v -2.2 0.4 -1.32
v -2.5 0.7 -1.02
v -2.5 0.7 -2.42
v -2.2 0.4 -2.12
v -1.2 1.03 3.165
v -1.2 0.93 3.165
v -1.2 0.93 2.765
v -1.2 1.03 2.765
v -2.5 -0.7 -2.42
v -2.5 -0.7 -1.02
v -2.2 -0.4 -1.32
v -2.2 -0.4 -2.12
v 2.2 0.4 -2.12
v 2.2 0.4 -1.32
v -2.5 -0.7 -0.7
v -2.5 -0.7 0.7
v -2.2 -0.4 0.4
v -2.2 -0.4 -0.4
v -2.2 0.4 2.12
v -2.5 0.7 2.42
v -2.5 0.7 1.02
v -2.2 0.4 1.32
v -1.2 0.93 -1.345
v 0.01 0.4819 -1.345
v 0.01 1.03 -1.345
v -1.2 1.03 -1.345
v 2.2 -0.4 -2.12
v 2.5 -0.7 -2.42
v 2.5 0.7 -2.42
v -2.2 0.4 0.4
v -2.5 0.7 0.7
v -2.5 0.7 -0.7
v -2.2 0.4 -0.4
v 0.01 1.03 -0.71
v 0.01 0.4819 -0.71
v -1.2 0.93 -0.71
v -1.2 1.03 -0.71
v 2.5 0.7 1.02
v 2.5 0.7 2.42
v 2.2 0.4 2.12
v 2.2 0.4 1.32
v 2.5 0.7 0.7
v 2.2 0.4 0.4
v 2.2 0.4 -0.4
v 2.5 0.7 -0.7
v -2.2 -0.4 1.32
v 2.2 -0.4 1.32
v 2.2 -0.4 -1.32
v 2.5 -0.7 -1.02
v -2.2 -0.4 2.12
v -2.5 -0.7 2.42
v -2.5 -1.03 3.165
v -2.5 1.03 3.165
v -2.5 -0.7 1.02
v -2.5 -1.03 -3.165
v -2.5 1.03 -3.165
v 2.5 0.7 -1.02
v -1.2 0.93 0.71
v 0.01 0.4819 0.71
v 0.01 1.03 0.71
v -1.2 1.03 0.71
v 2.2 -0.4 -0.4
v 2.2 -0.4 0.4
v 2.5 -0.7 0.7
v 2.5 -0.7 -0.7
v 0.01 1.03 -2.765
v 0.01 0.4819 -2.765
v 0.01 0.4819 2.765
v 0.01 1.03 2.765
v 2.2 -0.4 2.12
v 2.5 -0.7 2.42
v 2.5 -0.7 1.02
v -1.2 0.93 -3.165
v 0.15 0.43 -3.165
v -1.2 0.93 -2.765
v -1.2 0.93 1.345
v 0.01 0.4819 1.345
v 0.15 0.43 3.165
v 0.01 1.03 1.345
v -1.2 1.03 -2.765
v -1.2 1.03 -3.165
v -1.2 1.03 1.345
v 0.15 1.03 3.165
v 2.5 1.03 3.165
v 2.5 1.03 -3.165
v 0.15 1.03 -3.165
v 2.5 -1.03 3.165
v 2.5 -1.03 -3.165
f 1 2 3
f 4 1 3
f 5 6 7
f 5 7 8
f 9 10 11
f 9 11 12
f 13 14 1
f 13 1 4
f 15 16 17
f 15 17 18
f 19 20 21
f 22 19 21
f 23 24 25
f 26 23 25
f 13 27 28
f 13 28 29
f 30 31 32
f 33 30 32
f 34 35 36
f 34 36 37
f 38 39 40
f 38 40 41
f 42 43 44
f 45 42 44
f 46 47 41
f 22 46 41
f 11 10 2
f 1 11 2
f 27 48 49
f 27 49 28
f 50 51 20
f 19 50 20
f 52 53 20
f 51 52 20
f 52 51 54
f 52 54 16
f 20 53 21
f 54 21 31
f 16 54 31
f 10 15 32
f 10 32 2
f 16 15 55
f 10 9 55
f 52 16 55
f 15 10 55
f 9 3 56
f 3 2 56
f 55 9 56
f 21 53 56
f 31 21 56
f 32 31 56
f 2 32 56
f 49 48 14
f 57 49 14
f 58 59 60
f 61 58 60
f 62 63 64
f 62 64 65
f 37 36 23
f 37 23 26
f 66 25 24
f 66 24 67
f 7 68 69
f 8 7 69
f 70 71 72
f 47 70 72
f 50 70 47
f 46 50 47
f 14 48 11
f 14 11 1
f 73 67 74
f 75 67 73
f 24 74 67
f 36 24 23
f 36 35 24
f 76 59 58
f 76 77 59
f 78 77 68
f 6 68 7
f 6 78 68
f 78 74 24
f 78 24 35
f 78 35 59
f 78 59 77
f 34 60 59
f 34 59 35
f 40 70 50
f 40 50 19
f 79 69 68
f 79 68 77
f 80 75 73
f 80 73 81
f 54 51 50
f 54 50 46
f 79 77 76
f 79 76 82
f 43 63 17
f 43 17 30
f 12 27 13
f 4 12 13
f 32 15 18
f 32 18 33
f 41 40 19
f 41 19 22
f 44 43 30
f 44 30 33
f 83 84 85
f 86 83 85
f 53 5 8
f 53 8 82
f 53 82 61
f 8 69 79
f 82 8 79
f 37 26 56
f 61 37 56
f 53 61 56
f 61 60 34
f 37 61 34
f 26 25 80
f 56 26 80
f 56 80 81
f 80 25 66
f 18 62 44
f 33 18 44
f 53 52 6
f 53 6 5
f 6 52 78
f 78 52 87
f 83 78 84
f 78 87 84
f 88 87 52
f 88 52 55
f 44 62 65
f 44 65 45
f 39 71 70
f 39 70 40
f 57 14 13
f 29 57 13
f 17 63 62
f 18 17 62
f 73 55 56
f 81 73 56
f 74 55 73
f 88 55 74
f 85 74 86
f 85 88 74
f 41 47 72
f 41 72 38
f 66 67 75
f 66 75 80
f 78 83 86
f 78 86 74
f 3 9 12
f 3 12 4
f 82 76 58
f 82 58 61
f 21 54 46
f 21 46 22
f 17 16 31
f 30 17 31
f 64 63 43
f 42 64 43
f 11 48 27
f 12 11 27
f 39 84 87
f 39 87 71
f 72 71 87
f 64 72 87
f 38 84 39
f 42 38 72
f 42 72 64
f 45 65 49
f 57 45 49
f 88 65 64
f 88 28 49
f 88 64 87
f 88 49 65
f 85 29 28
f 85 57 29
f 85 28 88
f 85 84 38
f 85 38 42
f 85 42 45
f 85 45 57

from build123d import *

# Parameters (mm, degrees)
SKETCH1_W           = 6.33
SKETCH1_H           = 2.06
SKETCH1_W_2         = 0.8
SKETCH1_H_2         = 0.8
BOSS_EXTRUDE1_DEPTH = 2.5
CUT_EXTRUDE1_DEPTH  = 7.25
SKETCH3_W           = 1.42
SKETCH3_H           = 0.63
BOSS_EXTRUDE2_DEPTH = 1.21
CHAMFER1_SIZE       = 0.3


with BuildPart() as part:
    # Sketch1 → Boss-Extrude1 (new, symmetric)
    with BuildSketch(Plane(origin=(0, 0, 0), x_dir=(0, 0, -1), z_dir=(1, 0, 0))):
        Rectangle(SKETCH1_W, SKETCH1_H)
        Rectangle(SKETCH1_W_2, SKETCH1_H_2, mode=Mode.SUBTRACT)
        with Locations((-1.72, 0)):
            Rectangle(SKETCH1_W_2, SKETCH1_H_2, mode=Mode.SUBTRACT)
        with Locations((1.72, 0)):
            Rectangle(SKETCH1_W_2, SKETCH1_H_2, mode=Mode.SUBTRACT)
    extrude(amount=BOSS_EXTRUDE1_DEPTH, both=True)

    # Sketch2 → Cut-Extrude1 (cut)
    with BuildSketch(Plane.XY.offset(3.165)):
        Polygon((-1.2, 2.722191774), (0.15, 2.722191774), (0.15, 0.43), (-1.2, 0.93), align=None)
    extrude(amount=-CUT_EXTRUDE1_DEPTH, mode=Mode.SUBTRACT)

    # Sketch3 → Boss-Extrude2 (add)
    with BuildSketch(Plane(origin=(-1.2, 0, 0), x_dir=(0, 0, -1), z_dir=(1, 0, 0))):
        with Locations((-2.055, 0.715)):
            Rectangle(SKETCH3_W, SKETCH3_H)
        with Locations((0, 0.715)):
            Rectangle(SKETCH3_W, SKETCH3_H)
        with Locations((2.055, 0.715)):
            Rectangle(SKETCH3_W, SKETCH3_H)
    extrude(amount=BOSS_EXTRUDE2_DEPTH)

    # Chamfer1
    chamfer1_edges = [part.edges().sort_by_distance(p)[0] for p in [
        (-2.5, 0, -0.4),
        (-2.5, 0.4, 0),
        (-2.5, 0, 0.4),
        (-2.5, -0.4, 0),
        (2.5, 0, -0.4),
        (2.5, 0.4, 0),
        (2.5, 0, 0.4),
        (2.5, -0.4, 0),
        (-2.5, 0, 1.32),
        (-2.5, 0.4, 1.72),
        (-2.5, 0, 2.12),
        (-2.5, -0.4, 1.72),
        (2.5, 0, 1.32),
        (2.5, 0.4, 1.72),
        (2.5, 0, 2.12),
        (2.5, -0.4, 1.72),
        (-2.5, 0, -2.12),
        (-2.5, 0.4, -1.72),
        (-2.5, 0, -1.32),
        (-2.5, -0.4, -1.72),
        (2.5, 0, -2.12),
        (2.5, 0.4, -1.72),
        (2.5, 0, -1.32),
        (2.5, -0.4, -1.72),
    ]]
    chamfer(chamfer1_edges, length=CHAMFER1_SIZE)


solid = part.part
